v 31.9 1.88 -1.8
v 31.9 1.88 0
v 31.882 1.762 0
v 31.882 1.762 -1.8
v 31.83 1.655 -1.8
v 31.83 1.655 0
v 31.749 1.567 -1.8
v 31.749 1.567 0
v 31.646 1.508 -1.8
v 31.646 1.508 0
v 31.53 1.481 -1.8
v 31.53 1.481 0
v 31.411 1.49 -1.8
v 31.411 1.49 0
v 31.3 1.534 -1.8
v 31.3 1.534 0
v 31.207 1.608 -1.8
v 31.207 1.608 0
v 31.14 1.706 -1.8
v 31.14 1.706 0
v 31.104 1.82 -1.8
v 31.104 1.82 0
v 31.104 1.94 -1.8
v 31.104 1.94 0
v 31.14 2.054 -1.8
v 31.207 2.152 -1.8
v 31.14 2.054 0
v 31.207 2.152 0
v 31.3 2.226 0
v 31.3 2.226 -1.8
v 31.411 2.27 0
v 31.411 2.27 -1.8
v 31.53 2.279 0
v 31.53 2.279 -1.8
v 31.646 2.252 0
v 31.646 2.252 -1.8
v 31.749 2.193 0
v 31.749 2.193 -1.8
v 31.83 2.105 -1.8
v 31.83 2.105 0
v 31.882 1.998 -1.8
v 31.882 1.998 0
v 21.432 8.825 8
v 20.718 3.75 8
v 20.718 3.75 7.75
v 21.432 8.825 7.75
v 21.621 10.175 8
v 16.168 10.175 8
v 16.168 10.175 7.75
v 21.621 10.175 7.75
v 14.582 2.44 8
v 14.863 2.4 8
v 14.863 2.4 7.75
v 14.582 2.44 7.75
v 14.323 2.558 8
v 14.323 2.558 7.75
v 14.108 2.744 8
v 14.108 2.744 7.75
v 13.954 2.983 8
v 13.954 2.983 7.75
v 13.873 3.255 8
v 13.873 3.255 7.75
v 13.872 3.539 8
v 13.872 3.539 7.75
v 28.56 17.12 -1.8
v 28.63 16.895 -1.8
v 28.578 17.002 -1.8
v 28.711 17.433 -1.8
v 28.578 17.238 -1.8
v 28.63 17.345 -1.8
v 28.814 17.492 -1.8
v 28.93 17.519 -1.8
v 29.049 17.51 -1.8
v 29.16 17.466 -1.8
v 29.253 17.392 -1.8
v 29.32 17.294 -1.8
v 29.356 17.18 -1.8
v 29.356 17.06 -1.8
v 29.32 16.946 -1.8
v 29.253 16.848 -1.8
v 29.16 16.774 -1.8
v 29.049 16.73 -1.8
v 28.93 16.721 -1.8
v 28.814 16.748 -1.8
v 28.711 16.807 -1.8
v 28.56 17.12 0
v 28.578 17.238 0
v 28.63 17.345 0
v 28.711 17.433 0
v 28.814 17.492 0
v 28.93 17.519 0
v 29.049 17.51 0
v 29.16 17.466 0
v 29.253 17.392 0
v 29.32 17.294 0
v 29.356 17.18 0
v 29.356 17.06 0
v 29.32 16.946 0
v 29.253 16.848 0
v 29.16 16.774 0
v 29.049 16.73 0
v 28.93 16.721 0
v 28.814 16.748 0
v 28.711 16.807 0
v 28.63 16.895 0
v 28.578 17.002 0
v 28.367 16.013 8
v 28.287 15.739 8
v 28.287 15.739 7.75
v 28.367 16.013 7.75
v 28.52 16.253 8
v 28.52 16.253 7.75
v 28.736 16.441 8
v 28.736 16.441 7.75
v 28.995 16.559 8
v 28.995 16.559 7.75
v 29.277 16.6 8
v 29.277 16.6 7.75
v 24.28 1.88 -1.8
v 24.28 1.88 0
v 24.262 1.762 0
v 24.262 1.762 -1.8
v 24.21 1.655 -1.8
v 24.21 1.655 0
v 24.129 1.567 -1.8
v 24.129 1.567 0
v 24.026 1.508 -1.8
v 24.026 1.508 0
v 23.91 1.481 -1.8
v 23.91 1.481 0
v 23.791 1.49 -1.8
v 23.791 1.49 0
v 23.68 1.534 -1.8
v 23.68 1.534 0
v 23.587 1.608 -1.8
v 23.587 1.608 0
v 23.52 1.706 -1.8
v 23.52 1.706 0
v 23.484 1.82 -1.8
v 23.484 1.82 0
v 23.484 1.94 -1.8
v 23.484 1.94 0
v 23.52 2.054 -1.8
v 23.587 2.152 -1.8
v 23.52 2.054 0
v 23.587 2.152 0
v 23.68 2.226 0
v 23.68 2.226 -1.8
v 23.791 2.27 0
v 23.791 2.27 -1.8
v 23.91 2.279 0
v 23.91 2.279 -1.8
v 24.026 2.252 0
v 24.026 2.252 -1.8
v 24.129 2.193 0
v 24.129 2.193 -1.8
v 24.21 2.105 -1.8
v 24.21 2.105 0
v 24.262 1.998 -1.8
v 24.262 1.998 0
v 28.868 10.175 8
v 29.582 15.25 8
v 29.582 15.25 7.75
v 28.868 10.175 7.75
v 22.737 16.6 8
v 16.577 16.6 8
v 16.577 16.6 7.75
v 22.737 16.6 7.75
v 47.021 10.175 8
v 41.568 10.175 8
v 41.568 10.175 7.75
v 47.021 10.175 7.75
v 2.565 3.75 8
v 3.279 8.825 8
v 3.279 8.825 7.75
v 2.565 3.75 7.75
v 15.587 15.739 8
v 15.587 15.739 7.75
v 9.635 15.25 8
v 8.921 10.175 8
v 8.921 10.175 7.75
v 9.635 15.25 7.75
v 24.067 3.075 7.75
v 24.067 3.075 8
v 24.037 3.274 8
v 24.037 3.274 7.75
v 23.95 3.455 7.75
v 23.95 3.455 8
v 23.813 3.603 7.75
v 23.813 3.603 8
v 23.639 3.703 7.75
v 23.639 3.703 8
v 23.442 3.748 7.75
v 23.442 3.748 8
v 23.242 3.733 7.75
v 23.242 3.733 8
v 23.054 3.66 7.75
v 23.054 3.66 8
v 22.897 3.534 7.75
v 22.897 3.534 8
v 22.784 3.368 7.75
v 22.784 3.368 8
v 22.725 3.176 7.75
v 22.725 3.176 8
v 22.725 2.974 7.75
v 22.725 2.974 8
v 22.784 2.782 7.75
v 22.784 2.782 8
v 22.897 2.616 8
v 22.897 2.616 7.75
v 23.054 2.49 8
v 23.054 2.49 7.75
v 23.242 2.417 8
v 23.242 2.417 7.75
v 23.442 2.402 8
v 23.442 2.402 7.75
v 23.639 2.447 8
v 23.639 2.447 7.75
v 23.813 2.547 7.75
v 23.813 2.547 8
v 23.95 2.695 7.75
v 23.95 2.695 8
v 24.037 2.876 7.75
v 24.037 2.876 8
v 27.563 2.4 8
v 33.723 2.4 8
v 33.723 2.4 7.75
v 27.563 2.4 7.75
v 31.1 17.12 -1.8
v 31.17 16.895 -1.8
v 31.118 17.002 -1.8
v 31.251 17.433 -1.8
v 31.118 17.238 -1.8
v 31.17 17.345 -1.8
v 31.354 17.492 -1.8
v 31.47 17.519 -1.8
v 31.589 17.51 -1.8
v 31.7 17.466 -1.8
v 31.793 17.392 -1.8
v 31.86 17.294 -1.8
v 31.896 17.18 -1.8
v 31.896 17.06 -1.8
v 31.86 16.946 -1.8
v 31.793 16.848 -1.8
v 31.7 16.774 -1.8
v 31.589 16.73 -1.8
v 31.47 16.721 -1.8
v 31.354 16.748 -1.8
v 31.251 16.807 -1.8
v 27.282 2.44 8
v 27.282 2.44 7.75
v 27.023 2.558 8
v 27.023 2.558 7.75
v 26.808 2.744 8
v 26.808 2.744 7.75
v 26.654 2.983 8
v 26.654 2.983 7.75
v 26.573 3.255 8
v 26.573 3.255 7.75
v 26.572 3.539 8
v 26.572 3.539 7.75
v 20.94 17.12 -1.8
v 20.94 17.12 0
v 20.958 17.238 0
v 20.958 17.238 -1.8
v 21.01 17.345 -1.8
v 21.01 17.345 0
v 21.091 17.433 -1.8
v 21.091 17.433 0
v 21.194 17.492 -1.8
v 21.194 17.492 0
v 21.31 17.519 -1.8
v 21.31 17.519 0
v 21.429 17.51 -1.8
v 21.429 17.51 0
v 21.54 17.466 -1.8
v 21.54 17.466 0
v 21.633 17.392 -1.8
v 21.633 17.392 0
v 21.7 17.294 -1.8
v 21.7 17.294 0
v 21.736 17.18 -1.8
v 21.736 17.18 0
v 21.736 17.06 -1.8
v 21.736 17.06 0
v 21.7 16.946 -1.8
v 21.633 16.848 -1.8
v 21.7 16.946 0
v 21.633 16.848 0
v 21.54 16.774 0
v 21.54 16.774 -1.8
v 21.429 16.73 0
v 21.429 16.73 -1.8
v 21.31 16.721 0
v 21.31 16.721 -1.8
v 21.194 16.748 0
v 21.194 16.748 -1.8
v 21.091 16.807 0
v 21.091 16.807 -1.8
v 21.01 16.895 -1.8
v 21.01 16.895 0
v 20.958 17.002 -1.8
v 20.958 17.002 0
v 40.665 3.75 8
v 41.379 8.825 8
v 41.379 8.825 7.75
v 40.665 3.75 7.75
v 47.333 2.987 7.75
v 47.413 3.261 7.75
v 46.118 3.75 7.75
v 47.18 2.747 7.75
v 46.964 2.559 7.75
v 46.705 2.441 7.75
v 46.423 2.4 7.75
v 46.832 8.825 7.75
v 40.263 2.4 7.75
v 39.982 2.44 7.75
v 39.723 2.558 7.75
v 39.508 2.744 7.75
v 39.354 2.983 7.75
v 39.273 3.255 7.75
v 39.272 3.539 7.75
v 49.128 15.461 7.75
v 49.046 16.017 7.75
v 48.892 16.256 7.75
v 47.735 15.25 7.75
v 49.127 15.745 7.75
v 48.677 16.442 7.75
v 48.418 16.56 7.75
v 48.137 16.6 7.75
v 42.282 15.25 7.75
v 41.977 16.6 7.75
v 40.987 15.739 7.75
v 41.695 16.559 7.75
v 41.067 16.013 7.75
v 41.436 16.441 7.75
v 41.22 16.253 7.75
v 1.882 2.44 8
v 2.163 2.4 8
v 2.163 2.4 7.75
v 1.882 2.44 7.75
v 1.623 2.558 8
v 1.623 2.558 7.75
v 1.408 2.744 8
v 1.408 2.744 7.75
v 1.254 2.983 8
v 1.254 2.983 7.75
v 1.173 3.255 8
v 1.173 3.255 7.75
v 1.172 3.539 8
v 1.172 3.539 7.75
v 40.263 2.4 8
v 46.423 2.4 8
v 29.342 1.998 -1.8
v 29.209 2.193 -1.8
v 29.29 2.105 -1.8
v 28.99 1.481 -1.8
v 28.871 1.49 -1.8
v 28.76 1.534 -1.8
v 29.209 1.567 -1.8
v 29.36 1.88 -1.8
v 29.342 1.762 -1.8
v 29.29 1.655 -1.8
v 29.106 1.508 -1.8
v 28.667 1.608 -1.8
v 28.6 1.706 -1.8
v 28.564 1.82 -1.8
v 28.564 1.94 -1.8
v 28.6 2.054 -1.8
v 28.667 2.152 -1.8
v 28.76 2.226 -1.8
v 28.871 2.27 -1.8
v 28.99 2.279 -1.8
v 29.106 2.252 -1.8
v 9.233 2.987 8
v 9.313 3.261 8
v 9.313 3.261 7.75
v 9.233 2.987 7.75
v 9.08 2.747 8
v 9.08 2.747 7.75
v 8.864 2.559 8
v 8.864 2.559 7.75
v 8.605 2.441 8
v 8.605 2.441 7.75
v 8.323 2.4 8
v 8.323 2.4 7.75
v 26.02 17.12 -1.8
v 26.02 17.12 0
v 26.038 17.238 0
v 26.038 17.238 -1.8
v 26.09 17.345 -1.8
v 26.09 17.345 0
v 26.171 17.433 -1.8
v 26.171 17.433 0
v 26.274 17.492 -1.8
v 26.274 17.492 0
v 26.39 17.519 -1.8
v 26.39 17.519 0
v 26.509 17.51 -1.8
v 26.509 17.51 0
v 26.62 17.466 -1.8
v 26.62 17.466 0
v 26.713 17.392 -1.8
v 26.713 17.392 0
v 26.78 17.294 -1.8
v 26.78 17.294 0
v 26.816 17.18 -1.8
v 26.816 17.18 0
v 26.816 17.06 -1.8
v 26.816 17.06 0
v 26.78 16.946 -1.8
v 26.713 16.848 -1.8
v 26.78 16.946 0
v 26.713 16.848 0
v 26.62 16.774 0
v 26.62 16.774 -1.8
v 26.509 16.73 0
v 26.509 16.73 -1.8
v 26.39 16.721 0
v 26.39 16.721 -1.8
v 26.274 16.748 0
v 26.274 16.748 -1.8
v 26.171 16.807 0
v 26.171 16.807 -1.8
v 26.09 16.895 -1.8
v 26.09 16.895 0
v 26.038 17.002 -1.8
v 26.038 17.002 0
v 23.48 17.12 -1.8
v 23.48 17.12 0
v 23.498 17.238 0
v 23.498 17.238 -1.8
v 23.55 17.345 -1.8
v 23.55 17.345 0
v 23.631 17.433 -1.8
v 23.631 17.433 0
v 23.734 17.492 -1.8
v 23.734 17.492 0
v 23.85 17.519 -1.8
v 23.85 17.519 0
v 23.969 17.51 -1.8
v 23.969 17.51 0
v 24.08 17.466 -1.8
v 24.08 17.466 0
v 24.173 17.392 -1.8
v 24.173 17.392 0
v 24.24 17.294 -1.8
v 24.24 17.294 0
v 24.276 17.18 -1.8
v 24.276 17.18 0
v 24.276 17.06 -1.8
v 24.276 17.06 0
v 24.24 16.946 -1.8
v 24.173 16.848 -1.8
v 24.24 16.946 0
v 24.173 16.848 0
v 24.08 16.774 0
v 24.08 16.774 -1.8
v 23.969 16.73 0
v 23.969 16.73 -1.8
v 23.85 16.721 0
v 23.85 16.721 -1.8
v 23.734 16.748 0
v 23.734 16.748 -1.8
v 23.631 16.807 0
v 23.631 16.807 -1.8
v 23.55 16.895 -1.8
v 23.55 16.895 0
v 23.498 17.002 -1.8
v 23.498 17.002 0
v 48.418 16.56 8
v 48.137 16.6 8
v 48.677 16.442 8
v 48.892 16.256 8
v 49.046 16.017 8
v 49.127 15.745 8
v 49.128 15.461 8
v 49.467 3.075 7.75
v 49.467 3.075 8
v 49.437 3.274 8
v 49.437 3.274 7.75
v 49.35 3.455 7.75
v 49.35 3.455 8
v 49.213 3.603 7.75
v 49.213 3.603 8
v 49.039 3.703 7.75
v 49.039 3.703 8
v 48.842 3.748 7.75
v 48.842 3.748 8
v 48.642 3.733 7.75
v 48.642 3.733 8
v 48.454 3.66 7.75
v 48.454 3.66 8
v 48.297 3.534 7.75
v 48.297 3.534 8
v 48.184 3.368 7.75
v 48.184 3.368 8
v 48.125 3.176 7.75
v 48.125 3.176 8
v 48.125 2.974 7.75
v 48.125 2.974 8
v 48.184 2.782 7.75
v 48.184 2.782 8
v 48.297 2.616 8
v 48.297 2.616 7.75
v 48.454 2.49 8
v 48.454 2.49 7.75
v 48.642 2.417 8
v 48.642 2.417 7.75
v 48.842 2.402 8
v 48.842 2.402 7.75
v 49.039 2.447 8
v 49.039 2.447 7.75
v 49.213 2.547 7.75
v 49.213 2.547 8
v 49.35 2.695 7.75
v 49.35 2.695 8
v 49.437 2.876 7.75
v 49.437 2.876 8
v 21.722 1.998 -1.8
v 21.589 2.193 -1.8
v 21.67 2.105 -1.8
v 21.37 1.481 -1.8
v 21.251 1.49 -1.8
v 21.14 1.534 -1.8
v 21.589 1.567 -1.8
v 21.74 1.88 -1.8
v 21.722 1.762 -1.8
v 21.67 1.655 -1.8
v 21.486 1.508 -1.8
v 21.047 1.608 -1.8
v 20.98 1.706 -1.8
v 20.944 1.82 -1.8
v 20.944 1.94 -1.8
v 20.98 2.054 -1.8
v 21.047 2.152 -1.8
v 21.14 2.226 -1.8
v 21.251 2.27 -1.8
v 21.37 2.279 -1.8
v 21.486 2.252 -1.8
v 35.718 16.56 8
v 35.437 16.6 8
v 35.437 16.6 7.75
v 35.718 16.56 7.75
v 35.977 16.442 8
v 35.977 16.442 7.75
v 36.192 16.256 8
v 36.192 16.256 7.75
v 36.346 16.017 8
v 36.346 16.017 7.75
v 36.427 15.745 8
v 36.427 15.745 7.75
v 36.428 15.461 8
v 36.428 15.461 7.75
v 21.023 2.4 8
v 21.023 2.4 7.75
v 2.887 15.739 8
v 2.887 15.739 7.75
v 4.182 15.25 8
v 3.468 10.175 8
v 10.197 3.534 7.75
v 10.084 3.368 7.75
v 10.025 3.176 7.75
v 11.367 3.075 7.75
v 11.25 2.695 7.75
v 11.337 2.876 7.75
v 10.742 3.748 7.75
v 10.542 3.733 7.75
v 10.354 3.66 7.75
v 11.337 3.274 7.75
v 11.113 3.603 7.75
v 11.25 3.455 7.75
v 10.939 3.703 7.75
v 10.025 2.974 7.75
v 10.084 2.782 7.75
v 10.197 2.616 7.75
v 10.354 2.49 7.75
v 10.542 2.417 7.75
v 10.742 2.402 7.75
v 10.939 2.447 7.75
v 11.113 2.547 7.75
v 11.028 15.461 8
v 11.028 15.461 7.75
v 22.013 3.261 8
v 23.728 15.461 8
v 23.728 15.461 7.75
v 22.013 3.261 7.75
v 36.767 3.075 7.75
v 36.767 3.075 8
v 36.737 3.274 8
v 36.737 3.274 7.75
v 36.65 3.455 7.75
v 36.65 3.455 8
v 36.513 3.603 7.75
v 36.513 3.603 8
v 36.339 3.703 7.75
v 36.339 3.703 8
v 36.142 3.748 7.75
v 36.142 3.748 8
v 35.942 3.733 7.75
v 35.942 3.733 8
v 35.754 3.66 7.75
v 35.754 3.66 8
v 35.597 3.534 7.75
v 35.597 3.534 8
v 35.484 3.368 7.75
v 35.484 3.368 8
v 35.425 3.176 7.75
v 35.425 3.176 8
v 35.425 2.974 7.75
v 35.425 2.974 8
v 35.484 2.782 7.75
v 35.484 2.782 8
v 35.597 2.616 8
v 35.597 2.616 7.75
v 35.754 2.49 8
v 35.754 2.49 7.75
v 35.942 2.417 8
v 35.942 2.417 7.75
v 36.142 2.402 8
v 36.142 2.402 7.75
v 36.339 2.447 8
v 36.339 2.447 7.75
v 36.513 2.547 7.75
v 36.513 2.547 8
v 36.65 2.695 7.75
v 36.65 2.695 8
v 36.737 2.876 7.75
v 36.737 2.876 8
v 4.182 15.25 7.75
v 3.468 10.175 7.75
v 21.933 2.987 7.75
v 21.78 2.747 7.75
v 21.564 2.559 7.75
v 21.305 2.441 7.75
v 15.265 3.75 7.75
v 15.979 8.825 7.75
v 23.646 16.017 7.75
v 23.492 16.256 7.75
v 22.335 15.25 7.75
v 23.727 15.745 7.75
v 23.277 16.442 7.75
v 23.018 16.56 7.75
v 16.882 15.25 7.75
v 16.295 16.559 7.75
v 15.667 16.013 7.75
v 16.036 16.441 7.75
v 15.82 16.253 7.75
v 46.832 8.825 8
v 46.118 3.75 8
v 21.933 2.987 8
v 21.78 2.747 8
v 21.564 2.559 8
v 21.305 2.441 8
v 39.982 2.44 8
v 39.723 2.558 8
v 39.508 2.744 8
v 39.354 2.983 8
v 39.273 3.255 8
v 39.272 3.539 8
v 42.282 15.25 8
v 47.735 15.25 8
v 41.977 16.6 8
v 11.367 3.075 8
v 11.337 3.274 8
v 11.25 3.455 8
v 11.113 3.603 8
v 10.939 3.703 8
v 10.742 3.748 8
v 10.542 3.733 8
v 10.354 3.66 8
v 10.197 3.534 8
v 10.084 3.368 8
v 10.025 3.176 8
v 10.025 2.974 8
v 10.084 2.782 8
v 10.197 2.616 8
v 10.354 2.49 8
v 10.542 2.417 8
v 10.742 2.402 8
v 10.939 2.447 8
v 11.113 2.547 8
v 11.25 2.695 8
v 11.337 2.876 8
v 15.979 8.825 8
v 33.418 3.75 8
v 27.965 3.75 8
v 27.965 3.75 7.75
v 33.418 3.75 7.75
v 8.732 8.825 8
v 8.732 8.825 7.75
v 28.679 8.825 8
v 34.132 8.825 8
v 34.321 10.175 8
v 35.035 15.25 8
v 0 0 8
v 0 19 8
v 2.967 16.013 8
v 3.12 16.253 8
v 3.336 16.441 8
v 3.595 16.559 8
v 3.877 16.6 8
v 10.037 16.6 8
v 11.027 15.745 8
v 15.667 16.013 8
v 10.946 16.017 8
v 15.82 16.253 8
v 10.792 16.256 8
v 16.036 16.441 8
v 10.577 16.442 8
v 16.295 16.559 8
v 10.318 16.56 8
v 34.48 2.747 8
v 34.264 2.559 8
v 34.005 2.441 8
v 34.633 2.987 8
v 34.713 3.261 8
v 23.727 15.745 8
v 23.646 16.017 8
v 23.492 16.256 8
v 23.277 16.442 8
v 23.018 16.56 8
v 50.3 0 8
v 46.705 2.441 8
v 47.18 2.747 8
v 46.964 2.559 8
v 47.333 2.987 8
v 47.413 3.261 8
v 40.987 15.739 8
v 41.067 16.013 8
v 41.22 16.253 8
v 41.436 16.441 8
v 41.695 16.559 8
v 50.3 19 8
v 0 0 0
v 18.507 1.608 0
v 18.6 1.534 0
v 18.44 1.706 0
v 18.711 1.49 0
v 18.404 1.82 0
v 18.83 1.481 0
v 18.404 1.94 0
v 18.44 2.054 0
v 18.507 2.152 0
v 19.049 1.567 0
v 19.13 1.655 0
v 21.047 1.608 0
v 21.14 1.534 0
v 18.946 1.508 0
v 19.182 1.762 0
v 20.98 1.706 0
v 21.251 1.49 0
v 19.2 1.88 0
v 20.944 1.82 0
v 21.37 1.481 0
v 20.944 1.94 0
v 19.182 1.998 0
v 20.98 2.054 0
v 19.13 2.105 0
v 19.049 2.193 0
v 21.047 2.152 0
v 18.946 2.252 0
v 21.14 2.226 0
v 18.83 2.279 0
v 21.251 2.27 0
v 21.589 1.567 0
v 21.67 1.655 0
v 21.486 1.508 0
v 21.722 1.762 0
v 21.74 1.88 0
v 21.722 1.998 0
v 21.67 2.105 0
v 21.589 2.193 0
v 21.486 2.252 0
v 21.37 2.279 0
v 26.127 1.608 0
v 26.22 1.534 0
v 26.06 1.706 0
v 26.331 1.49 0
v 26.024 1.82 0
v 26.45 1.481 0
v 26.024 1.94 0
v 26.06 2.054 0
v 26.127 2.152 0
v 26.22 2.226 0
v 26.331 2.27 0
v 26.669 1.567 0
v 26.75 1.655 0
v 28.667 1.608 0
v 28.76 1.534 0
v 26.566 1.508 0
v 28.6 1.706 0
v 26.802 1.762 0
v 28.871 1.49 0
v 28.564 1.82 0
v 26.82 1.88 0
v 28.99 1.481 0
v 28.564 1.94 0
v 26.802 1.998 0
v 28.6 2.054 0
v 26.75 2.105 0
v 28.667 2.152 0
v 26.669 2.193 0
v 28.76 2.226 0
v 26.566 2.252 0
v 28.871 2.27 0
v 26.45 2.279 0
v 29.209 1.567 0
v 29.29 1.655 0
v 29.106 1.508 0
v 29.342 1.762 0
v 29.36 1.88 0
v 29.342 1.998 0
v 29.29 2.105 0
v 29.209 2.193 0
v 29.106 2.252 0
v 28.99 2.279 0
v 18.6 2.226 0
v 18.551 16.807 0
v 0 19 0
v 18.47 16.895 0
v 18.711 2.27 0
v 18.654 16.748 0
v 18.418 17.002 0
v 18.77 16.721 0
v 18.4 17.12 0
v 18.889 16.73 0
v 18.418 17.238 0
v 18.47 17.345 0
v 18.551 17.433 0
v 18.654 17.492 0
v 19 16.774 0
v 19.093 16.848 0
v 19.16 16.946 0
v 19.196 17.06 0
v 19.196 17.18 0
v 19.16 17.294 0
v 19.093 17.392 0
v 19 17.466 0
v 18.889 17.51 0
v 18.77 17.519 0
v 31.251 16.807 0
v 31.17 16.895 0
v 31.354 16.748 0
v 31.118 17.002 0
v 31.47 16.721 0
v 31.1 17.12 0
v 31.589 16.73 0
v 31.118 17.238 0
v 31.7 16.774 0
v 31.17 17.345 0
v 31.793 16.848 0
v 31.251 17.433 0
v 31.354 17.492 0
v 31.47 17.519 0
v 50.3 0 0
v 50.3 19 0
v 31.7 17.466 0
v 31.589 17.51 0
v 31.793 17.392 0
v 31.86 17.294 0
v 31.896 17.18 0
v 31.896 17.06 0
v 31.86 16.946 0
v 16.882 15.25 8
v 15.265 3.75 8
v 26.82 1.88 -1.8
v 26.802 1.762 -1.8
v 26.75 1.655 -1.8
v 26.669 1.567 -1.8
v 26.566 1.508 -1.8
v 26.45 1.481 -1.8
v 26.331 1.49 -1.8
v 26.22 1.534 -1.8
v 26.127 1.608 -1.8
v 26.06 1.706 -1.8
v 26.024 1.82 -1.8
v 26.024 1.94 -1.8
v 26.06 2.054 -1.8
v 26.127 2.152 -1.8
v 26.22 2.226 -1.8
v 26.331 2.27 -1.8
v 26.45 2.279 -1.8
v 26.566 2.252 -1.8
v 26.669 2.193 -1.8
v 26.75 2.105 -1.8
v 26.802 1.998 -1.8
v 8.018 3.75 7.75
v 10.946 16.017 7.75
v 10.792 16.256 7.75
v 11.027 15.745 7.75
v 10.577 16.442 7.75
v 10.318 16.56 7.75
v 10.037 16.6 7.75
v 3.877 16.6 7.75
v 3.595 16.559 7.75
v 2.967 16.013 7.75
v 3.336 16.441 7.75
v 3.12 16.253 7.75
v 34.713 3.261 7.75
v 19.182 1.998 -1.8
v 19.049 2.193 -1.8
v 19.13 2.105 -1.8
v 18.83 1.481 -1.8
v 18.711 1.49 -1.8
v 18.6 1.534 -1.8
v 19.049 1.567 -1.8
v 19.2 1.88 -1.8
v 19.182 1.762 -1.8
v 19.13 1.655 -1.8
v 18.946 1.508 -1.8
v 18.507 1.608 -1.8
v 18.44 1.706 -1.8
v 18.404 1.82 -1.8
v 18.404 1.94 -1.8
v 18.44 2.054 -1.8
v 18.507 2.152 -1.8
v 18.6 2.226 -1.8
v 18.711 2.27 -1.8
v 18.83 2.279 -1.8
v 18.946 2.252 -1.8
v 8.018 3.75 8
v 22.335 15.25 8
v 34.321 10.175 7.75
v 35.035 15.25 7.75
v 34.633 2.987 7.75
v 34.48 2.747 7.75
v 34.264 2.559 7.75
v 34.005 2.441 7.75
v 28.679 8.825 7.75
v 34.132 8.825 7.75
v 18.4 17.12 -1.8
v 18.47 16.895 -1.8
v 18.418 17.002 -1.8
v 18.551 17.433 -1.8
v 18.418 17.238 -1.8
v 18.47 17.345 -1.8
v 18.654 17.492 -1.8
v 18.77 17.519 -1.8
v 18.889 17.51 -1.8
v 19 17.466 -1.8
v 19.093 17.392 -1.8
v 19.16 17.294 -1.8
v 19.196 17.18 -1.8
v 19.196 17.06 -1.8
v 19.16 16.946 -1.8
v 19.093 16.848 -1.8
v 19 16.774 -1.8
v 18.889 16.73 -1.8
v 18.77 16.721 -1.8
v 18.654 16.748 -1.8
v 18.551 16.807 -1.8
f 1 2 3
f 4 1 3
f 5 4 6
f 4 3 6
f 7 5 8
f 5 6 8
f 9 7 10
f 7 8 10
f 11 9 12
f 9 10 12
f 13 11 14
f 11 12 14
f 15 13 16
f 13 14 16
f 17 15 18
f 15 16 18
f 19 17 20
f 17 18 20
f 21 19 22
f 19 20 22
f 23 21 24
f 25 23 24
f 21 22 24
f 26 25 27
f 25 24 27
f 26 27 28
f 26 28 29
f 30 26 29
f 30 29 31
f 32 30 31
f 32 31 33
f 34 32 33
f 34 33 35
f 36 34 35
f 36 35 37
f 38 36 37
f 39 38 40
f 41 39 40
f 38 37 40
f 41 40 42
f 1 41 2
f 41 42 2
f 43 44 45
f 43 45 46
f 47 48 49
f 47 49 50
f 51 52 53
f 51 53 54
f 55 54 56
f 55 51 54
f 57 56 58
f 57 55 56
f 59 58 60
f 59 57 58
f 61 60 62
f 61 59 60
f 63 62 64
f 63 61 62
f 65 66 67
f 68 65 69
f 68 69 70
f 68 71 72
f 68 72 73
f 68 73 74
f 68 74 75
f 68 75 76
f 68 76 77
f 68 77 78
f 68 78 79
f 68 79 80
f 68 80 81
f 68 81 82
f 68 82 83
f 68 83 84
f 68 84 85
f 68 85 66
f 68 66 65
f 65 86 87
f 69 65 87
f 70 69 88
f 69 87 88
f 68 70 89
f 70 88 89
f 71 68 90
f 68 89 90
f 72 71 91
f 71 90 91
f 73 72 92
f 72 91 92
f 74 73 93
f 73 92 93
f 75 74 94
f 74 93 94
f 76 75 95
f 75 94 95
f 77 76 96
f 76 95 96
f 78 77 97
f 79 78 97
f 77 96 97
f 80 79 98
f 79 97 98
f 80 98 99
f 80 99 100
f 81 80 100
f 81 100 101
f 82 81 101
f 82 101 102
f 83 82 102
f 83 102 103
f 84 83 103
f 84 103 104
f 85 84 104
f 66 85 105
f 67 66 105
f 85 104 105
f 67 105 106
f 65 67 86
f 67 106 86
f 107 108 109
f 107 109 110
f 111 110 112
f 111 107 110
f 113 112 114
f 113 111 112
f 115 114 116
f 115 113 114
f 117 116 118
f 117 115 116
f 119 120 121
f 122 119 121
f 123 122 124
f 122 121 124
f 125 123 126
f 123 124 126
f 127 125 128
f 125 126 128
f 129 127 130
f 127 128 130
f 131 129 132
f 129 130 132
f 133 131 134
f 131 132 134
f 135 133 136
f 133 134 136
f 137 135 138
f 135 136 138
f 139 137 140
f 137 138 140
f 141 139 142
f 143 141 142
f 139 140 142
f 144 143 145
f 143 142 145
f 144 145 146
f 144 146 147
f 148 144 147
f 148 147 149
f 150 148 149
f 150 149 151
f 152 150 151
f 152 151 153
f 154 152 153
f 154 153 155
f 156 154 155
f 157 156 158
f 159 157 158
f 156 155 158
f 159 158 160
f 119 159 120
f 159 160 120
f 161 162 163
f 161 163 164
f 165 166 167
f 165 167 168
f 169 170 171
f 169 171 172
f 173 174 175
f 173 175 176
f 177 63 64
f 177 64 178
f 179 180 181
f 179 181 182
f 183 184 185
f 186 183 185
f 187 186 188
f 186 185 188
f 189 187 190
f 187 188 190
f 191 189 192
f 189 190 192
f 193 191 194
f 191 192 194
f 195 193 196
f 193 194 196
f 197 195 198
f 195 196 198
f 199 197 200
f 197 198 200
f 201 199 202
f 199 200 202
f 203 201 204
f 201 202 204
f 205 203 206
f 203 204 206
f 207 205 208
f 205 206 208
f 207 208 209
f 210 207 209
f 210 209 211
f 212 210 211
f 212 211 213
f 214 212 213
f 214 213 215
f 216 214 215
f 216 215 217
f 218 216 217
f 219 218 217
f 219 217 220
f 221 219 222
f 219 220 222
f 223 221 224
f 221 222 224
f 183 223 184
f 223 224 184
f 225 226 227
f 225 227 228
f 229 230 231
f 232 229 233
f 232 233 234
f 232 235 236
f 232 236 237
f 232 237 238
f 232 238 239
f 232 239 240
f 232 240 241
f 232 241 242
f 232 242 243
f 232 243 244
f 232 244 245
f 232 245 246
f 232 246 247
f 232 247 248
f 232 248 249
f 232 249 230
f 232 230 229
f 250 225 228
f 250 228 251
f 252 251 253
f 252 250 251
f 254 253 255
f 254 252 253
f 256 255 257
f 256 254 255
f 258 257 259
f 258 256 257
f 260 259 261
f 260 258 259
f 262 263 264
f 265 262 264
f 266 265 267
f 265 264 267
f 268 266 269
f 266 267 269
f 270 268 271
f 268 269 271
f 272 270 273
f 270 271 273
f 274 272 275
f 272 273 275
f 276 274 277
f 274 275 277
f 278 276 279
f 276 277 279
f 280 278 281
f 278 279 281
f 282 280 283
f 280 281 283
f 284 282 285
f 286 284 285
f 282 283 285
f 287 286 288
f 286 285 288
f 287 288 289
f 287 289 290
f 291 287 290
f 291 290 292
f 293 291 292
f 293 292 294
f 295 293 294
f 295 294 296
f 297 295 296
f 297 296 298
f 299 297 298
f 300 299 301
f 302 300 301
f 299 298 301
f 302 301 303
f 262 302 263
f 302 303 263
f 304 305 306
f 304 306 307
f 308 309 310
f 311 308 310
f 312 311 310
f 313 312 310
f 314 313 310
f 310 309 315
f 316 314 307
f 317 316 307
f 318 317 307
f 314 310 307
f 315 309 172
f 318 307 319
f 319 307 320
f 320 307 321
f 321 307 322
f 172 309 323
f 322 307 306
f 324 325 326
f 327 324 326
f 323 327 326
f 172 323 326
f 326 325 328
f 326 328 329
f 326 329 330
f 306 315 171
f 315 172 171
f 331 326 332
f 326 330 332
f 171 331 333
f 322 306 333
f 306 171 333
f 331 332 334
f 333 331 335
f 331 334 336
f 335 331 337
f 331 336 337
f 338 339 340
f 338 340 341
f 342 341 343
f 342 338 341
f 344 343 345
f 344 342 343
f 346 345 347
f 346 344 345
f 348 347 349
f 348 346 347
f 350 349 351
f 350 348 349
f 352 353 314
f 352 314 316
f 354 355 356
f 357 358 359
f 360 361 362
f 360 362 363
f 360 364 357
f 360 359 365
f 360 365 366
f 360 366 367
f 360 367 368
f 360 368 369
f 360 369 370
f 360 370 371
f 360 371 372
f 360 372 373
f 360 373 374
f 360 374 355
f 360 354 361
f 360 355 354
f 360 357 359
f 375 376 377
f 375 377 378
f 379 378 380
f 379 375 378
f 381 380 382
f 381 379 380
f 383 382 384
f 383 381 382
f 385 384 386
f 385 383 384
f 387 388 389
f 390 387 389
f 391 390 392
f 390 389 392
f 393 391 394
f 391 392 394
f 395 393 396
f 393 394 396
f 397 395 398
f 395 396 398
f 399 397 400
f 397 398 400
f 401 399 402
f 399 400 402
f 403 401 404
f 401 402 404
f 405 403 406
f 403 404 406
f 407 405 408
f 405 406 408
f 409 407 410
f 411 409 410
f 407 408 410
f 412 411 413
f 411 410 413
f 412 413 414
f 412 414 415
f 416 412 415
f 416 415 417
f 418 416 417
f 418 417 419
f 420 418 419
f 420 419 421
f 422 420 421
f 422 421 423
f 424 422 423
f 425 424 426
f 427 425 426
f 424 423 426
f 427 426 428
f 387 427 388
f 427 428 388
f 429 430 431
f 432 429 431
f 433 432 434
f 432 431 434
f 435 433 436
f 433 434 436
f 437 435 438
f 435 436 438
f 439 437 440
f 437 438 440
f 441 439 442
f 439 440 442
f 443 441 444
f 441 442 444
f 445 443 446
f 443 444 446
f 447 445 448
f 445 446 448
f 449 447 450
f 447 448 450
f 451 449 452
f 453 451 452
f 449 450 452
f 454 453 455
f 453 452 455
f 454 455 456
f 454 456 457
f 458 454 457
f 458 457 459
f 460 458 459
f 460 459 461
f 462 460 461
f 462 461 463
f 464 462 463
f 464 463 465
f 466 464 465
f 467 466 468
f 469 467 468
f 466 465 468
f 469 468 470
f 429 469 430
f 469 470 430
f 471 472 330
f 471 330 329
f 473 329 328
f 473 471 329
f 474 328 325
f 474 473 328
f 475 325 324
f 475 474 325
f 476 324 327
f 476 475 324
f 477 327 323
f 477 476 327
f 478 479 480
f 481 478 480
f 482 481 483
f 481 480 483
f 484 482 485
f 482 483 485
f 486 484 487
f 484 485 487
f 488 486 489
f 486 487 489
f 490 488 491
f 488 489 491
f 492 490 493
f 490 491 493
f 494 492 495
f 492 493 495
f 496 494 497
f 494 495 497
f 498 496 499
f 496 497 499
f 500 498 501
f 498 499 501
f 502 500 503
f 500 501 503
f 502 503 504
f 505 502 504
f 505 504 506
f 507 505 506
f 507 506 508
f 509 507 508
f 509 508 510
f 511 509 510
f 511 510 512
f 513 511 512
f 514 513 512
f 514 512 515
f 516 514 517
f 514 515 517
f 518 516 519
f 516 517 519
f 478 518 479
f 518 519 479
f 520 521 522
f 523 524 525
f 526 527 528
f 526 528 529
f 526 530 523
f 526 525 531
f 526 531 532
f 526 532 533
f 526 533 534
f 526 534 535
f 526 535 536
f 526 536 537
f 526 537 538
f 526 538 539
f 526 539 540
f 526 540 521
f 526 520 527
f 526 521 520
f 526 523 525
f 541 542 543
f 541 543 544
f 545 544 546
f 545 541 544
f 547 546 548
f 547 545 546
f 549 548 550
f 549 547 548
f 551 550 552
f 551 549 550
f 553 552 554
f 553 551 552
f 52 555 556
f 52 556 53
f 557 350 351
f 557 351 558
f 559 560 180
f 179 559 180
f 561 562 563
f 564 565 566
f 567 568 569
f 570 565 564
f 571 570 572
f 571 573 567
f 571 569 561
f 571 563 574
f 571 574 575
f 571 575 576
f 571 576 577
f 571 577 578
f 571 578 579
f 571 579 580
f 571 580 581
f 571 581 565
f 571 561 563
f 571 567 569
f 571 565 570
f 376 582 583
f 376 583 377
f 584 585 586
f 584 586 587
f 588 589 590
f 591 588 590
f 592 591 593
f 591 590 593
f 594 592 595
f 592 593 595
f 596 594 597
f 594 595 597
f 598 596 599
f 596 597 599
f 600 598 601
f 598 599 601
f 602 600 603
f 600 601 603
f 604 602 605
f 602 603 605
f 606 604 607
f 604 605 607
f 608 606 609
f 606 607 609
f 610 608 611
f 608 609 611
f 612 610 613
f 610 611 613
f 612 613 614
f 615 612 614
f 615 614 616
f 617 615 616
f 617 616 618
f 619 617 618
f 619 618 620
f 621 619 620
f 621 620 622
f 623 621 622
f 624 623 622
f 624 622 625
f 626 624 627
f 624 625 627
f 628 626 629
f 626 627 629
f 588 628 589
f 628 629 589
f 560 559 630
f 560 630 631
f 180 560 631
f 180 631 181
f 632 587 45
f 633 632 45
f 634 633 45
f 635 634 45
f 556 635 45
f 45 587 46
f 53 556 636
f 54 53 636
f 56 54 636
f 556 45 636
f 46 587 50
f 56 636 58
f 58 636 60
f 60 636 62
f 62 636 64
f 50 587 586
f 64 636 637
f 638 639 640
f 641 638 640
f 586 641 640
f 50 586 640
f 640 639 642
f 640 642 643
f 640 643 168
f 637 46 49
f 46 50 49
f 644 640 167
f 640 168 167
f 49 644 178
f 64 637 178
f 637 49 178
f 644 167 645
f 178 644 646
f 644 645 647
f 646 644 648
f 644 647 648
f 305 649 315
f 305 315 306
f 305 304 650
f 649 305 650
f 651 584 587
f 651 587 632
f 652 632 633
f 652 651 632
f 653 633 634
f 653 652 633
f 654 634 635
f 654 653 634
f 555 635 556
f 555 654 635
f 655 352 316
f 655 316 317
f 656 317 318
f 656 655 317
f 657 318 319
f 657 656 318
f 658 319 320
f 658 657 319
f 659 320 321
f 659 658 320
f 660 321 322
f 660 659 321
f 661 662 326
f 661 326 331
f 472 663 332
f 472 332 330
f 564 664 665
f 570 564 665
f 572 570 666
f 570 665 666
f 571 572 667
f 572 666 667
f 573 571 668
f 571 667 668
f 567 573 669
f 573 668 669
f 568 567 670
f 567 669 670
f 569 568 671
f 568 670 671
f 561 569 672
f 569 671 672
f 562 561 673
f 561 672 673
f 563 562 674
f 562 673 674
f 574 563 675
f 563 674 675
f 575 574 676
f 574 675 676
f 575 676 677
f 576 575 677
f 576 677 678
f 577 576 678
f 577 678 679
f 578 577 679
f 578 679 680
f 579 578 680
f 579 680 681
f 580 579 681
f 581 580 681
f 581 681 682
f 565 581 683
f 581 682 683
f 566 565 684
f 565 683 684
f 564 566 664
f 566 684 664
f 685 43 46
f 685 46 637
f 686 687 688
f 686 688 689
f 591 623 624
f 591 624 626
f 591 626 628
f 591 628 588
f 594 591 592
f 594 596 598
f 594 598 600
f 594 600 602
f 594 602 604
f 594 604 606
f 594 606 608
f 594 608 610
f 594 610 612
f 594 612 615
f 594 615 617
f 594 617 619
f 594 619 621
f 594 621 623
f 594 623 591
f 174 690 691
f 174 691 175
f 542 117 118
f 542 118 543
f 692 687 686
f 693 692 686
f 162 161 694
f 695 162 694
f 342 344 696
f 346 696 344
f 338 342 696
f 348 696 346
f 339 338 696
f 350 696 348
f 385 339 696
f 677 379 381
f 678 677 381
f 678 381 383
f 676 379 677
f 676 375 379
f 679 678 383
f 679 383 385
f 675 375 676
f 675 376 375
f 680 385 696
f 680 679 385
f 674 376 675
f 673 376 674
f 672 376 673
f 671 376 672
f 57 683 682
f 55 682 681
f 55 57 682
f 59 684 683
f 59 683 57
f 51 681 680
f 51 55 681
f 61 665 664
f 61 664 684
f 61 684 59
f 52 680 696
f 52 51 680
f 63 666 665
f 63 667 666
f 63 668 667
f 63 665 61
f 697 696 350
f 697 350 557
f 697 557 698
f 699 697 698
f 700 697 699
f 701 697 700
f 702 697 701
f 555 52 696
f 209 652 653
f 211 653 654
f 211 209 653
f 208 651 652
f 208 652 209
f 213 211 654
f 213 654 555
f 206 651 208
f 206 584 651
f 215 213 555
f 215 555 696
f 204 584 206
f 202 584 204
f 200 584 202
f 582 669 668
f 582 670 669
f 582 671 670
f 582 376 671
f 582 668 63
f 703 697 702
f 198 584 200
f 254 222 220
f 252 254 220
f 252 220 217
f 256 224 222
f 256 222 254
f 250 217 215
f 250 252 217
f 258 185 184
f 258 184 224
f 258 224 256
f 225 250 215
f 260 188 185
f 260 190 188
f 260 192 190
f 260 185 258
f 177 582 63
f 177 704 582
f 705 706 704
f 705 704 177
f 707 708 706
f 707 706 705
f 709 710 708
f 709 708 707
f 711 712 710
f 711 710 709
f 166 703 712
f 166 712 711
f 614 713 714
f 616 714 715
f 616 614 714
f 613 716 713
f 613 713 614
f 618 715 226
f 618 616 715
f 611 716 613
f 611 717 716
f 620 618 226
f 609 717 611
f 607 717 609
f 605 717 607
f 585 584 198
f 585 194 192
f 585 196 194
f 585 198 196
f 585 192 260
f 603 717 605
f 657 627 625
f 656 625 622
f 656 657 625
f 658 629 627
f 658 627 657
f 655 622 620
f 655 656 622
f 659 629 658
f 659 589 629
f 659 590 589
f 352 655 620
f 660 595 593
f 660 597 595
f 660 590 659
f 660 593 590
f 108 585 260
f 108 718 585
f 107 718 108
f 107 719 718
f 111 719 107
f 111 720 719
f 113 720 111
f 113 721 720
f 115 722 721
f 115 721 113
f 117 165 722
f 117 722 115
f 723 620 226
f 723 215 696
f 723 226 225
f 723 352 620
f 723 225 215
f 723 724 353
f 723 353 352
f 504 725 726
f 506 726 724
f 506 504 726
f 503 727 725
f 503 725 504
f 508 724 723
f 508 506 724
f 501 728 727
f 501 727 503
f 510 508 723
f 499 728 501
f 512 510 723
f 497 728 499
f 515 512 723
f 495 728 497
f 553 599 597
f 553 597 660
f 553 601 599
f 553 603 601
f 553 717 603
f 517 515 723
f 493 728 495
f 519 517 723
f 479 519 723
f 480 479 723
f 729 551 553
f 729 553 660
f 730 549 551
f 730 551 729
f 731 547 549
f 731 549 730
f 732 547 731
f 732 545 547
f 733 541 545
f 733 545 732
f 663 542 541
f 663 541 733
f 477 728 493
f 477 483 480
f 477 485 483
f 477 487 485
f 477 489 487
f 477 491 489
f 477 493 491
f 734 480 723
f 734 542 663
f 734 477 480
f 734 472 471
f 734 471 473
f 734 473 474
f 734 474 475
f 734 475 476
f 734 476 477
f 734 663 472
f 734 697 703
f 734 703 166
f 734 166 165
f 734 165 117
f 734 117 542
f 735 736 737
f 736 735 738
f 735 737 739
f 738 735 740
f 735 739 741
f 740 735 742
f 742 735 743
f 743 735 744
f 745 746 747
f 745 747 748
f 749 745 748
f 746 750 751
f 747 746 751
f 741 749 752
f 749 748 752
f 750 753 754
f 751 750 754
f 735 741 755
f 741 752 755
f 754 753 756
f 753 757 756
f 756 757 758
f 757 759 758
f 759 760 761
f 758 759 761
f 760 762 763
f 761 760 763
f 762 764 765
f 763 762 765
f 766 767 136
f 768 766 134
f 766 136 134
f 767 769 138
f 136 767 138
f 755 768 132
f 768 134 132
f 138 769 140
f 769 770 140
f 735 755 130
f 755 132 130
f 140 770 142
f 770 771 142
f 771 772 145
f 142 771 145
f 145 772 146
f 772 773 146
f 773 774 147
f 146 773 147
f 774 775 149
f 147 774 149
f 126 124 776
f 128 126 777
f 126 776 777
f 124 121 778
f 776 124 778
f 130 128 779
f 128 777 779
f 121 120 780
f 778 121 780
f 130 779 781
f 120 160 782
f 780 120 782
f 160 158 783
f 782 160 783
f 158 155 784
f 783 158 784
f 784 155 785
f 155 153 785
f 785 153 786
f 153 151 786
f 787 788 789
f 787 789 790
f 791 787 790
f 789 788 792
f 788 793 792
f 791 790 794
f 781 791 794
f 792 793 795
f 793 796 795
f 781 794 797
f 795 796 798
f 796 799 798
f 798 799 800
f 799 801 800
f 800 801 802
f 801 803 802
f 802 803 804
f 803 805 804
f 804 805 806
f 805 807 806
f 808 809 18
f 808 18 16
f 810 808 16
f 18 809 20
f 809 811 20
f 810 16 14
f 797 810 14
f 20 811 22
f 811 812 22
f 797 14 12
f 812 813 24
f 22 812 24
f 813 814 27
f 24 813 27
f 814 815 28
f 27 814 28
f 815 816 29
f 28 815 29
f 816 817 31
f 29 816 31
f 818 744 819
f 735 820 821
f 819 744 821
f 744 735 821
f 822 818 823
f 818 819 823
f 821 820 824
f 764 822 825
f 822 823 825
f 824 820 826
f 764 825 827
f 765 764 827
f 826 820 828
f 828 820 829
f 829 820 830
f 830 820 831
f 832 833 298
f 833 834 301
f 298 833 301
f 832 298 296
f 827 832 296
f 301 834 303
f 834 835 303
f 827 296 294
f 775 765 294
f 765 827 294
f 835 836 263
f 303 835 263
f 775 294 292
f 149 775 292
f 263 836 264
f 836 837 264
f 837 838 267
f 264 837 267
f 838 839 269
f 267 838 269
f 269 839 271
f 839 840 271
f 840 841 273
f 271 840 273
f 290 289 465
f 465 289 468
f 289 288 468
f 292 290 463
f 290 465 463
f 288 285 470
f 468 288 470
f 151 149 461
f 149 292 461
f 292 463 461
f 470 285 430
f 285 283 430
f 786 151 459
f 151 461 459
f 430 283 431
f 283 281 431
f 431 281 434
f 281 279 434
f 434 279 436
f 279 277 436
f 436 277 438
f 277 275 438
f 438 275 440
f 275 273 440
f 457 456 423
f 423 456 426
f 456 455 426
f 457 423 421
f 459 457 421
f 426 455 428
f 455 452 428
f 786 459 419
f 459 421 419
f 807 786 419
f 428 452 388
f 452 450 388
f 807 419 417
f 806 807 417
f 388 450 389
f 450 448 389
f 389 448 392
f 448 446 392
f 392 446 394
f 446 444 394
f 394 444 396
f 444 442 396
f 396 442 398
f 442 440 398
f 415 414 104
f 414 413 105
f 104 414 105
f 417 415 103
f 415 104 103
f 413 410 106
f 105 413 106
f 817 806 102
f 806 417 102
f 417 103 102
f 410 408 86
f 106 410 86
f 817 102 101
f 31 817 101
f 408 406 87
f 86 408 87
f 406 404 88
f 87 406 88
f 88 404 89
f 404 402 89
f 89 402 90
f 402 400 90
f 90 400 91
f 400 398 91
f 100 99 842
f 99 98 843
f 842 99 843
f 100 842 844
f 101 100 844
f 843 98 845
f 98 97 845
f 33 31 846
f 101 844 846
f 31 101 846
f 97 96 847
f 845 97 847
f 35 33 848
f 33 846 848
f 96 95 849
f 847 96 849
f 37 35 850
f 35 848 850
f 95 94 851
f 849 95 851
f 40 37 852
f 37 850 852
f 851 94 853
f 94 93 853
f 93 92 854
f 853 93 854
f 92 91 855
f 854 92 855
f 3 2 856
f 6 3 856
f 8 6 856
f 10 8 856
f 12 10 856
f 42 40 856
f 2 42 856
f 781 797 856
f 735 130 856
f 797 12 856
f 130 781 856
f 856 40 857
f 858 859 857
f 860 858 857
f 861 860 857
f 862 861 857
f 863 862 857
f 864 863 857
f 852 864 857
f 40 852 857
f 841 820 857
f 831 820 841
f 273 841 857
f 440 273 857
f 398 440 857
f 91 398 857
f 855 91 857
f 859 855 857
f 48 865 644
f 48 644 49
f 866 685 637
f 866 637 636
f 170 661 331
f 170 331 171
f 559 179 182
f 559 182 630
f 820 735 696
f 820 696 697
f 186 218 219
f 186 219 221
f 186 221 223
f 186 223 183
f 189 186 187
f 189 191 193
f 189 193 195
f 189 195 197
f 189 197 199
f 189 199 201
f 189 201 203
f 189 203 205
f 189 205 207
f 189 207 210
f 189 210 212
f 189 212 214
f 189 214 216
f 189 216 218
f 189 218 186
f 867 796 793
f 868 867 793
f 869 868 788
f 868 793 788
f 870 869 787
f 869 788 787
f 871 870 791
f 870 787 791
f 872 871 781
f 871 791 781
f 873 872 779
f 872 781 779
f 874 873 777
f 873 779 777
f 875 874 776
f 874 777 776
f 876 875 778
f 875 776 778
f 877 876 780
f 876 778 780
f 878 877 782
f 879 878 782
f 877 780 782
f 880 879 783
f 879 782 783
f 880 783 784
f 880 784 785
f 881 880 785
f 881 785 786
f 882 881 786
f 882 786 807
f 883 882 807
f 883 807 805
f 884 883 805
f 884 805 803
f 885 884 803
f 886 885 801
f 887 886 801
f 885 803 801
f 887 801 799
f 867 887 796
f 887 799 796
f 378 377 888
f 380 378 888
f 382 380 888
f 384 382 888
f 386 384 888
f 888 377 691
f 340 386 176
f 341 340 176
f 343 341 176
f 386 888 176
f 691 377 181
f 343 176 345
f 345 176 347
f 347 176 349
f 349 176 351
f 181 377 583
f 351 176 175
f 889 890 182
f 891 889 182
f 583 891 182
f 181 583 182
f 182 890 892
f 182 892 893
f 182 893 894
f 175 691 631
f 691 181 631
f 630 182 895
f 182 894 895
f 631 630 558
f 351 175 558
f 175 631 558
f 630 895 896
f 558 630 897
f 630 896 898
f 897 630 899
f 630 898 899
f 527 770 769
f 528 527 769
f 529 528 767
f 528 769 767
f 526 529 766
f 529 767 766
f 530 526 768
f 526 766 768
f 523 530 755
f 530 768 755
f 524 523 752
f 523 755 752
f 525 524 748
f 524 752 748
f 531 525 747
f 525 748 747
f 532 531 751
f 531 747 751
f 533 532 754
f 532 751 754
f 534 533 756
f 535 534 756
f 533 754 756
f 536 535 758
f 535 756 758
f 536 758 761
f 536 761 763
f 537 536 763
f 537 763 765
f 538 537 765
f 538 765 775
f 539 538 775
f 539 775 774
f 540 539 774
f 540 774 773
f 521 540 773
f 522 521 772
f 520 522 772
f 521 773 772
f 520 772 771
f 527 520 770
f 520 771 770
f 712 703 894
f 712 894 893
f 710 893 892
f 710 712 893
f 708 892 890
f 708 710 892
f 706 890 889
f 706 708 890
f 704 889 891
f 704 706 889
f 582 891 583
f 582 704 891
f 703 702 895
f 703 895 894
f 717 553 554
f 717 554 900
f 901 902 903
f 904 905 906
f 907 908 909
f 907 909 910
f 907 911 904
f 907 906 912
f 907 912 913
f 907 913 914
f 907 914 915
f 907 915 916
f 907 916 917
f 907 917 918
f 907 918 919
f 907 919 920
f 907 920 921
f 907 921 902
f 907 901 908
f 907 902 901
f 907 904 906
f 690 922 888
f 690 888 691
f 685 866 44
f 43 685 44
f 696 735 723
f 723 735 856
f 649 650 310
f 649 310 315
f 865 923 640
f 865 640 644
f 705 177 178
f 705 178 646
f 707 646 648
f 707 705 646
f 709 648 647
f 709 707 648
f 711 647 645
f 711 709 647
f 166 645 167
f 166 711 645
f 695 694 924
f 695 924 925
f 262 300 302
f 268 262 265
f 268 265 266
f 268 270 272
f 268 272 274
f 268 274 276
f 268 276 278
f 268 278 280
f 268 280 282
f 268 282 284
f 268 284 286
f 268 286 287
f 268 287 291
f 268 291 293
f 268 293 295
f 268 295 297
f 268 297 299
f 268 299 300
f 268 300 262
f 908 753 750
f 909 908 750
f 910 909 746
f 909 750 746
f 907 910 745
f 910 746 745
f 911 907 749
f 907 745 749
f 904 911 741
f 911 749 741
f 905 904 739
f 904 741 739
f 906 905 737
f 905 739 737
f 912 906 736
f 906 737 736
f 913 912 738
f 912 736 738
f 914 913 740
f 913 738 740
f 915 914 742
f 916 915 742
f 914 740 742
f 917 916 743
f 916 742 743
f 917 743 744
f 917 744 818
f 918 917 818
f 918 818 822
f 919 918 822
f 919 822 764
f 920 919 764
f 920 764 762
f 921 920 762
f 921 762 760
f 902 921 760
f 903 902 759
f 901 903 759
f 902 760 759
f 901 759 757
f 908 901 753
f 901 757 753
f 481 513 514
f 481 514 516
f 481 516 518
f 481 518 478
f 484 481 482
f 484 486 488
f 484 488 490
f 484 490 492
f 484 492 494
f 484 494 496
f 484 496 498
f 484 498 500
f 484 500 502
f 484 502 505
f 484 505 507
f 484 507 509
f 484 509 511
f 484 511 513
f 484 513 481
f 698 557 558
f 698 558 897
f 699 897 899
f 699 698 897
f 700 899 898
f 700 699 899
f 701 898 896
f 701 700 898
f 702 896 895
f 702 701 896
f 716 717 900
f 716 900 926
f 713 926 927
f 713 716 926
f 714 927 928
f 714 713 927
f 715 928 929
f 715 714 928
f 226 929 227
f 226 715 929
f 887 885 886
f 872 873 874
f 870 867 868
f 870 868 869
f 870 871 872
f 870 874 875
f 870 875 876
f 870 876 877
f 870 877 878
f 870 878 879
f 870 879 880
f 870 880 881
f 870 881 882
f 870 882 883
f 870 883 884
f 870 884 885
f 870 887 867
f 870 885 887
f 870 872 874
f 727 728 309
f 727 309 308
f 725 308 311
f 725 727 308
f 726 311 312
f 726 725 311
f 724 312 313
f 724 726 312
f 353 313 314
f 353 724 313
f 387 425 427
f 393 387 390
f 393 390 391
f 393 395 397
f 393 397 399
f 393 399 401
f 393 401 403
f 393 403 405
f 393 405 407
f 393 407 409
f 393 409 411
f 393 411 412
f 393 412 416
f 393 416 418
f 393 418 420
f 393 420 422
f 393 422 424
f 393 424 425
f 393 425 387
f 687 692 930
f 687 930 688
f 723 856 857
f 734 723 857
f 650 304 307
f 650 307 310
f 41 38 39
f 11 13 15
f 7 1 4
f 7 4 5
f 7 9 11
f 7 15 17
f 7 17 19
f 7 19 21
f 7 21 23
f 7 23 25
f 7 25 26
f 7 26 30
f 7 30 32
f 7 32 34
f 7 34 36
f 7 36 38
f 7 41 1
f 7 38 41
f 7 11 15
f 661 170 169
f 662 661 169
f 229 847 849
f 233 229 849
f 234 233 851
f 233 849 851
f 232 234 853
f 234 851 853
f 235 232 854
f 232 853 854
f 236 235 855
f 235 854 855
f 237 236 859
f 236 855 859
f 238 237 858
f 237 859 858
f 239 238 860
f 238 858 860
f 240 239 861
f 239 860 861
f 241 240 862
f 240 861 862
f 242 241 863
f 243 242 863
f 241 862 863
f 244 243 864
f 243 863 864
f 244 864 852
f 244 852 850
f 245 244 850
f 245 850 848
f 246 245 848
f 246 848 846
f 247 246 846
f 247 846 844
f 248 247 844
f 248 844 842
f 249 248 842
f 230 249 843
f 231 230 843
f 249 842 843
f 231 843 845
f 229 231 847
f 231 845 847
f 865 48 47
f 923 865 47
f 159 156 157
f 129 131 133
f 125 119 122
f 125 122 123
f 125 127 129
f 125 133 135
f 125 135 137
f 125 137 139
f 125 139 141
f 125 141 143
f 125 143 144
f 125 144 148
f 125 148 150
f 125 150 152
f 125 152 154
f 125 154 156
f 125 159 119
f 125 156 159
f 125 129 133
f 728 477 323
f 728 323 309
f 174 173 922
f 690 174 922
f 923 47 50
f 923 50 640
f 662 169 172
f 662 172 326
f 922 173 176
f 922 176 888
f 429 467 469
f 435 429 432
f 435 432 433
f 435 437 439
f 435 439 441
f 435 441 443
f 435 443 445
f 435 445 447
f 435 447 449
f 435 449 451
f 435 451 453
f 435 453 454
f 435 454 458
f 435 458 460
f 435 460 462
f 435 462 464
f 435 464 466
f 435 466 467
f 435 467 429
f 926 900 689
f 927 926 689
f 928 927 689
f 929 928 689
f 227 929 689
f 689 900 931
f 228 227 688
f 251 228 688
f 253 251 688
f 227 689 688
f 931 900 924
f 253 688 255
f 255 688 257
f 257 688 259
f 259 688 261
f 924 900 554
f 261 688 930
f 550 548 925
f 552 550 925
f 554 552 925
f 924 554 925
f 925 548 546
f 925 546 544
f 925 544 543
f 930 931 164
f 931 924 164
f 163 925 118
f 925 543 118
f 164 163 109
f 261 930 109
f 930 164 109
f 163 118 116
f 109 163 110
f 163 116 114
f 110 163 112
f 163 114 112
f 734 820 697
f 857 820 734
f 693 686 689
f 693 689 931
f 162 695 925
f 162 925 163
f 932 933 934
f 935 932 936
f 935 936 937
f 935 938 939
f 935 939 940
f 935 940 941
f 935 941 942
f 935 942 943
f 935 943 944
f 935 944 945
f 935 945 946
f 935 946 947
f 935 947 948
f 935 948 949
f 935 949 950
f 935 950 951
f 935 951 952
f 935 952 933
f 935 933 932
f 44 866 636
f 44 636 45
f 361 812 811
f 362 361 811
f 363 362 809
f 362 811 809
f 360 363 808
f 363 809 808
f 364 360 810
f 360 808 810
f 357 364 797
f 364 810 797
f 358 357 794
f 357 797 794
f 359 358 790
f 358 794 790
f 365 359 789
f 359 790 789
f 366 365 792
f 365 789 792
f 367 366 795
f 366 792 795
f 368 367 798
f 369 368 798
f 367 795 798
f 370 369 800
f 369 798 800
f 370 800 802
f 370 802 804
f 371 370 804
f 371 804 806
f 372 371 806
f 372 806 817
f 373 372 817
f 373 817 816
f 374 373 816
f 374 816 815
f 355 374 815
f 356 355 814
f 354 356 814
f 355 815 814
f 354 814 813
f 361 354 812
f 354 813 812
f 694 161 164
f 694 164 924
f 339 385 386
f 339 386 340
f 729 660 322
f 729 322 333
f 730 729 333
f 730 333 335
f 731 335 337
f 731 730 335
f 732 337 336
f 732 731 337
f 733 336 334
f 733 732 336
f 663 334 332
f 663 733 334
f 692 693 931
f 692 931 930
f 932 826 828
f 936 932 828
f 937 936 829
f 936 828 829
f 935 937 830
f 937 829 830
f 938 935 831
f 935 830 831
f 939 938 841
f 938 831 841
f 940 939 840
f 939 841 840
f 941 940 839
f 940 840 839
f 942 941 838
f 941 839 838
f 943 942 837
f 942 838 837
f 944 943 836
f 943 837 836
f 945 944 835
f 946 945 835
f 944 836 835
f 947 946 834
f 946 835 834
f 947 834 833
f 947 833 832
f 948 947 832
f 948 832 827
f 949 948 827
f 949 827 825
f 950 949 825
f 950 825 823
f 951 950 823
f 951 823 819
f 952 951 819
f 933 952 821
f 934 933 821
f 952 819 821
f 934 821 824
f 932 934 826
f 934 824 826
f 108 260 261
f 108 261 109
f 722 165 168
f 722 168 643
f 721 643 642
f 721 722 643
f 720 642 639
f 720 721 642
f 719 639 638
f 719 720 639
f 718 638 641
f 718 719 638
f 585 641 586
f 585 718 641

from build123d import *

# Parameters (mm, degrees)
SKETCH_1_W          = 50.3
SKETCH_1_H          = 19
EXTRUDE_1_DEPTH     = 8
SKETCH_2_R          = 0.4
EXTRUDE_2_DEPTH     = 1.8
SKETCH_3_R          = 0.675
CUT_EXTRUDE_1_DEPTH = 0.25


with BuildPart() as part:
    # 草图1 → 凸台-拉伸1 (new body)
    with BuildSketch(Plane.XY):
        with Locations((25.15, 9.5)):
            Rectangle(SKETCH_1_W, SKETCH_1_H)
    extrude(amount=EXTRUDE_1_DEPTH)

    # 草图2 → 凸台-拉伸2 (add)
    with BuildSketch(Plane(origin=(0, 0, 0), x_dir=(-1, 0, 0), z_dir=(0, 0, -1))):
        with Locations((-31.5, 17.12)):
            Circle(SKETCH_2_R)
        with Locations((-28.96, 17.12)):
            Circle(SKETCH_2_R)
        with Locations((-26.42, 17.12)):
            Circle(SKETCH_2_R)
        with Locations((-23.88, 17.12)):
            Circle(SKETCH_2_R)
        with Locations((-21.34, 17.12)):
            Circle(SKETCH_2_R)
        with Locations((-18.8, 17.12)):
            Circle(SKETCH_2_R)
        with Locations(Location((-18.8, 1.88, 0), (0, 0, 180))):
            Circle(SKETCH_2_R)
        with Locations(Location((-21.34, 1.88, 0), (0, 0, 180))):
            Circle(SKETCH_2_R)
        with Locations(Location((-23.88, 1.88, 0), (0, 0, 180))):
            Circle(SKETCH_2_R)
        with Locations(Location((-26.42, 1.88, 0), (0, 0, 180))):
            Circle(SKETCH_2_R)
        with Locations(Location((-28.96, 1.88, 0), (0, 0, 180))):
            Circle(SKETCH_2_R)
        with Locations(Location((-31.5, 1.88, 0), (0, 0, 180))):
            Circle(SKETCH_2_R)
    extrude(amount=EXTRUDE_2_DEPTH)

    # 草图3 → 切除-拉伸1 (cut)
    # profile 1 of 8: a face of its own
    with BuildSketch(Plane.XY.offset(8)):
        with BuildLine():
            ThreePointArc((9.312943073, 3.260826899), (8.978734033, 2.64529042), (8.322675004, 2.4))
            Line((8.322675004, 2.4), (2.162726812, 2.4))
            ThreePointArc((2.162726812, 2.4), (1.408017232, 2.743940971), (1.172458743, 3.539173101))
            Line((1.172458743, 3.539173101), (2.887056927, 15.739173101))
            ThreePointArc((2.887056927, 15.739173101), (3.221265967, 16.35470958), (3.877324996, 16.6))
            Line((3.877324996, 16.6), (10.037273188, 16.6))
            ThreePointArc((10.037273188, 16.6), (10.791982768, 16.256059029), (11.027541257, 15.460826899))
            Line((11.027541257, 15.460826899), (9.312943073, 3.260826899))
        make_face()
        Polygon((3.468330618, 10.175), (8.921399509, 10.175), (9.634644245, 15.25), (4.181575354, 15.25), align=None, mode=Mode.SUBTRACT)
        Polygon((3.278600491, 8.825), (2.565355755, 3.75), (8.018424646, 3.75), (8.731669382, 8.825), align=None, mode=Mode.SUBTRACT)
    # profile 2 of 8: a face of its own
    with BuildSketch(Plane.XY.offset(8)):
        with BuildLine():
            Line((23.727541257, 15.460826899), (22.012943073, 3.260826899))
            ThreePointArc((22.012943073, 3.260826899), (21.678734033, 2.64529042), (21.022675004, 2.4))
            Line((21.022675004, 2.4), (14.862726812, 2.4))
            ThreePointArc((14.862726812, 2.4), (14.108017232, 2.743940971), (13.872458743, 3.539173101))
            Line((13.872458743, 3.539173101), (15.587056927, 15.739173101))
            ThreePointArc((15.587056927, 15.739173101), (15.921265967, 16.35470958), (16.577324996, 16.6))
            Line((16.577324996, 16.6), (22.737273188, 16.6))
            ThreePointArc((22.737273188, 16.6), (23.491982768, 16.256059029), (23.727541257, 15.460826899))
        make_face()
        Polygon((16.168330618, 10.175), (21.621399509, 10.175), (22.334644245, 15.25), (16.881575354, 15.25), align=None, mode=Mode.SUBTRACT)
        Polygon((15.265355755, 3.75), (20.718424646, 3.75), (21.431669382, 8.825), (15.978600491, 8.825), align=None, mode=Mode.SUBTRACT)
    # profile 3 of 8: a face of its own
    with BuildSketch(Plane.XY.offset(8)):
        with BuildLine():
            Line((36.427541257, 15.460826899), (34.712943073, 3.260826899))
            ThreePointArc((34.712943073, 3.260826899), (34.378734033, 2.64529042), (33.722675004, 2.4))
            Line((33.722675004, 2.4), (27.562726812, 2.4))
            ThreePointArc((27.562726812, 2.4), (26.808017232, 2.743940971), (26.572458743, 3.539173101))
            Line((26.572458743, 3.539173101), (28.287056927, 15.739173101))
            ThreePointArc((28.287056927, 15.739173101), (28.621265967, 16.35470958), (29.277324996, 16.6))
            Line((29.277324996, 16.6), (35.437273188, 16.6))
            ThreePointArc((35.437273188, 16.6), (36.191982768, 16.256059029), (36.427541257, 15.460826899))
        make_face()
        Polygon((28.868330618, 10.175), (34.321399509, 10.175), (35.034644245, 15.25), (29.581575354, 15.25), align=None, mode=Mode.SUBTRACT)
        Polygon((27.965355755, 3.75), (33.418424646, 3.75), (34.131669382, 8.825), (28.678600491, 8.825), align=None, mode=Mode.SUBTRACT)
    # profile 4 of 8: a face of its own
    with BuildSketch(Plane.XY.offset(8)):
        with BuildLine():
            Line((49.127541257, 15.460826899), (47.412943073, 3.260826899))
            ThreePointArc((47.412943073, 3.260826899), (47.078734033, 2.64529042), (46.422675004, 2.4))
            Line((46.422675004, 2.4), (40.262726812, 2.4))
            ThreePointArc((40.262726812, 2.4), (39.508017232, 2.743940971), (39.272458743, 3.539173101))
            Line((39.272458743, 3.539173101), (40.987056927, 15.739173101))
            ThreePointArc((40.987056927, 15.739173101), (41.321265967, 16.35470958), (41.977324996, 16.6))
            Line((41.977324996, 16.6), (48.137273188, 16.6))
            ThreePointArc((48.137273188, 16.6), (48.891982768, 16.256059029), (49.127541257, 15.460826899))
        make_face()
        Polygon((41.568330618, 10.175), (47.021399509, 10.175), (47.734644245, 15.25), (42.281575354, 15.25), align=None, mode=Mode.SUBTRACT)
        Polygon((40.665355755, 3.75), (46.118424646, 3.75), (46.831669382, 8.825), (41.378600491, 8.825), align=None, mode=Mode.SUBTRACT)
    # profile 5 of 8: a face of its own
    with BuildSketch(Plane.XY.offset(8)):
        with Locations((10.691961742, 3.075)):
            Circle(SKETCH_3_R)
    # profile 6 of 8: a face of its own
    with BuildSketch(Plane.XY.offset(8)):
        with Locations((23.391961742, 3.075)):
            Circle(SKETCH_3_R)
    # profile 7 of 8: a face of its own
    with BuildSketch(Plane.XY.offset(8)):
        with Locations((36.091961742, 3.075)):
            Circle(SKETCH_3_R)
    # profile 8 of 8: a face of its own
    with BuildSketch(Plane.XY.offset(8)):
        with Locations((48.791961742, 3.075)):
            Circle(SKETCH_3_R)
    extrude(amount=-CUT_EXTRUDE_1_DEPTH, mode=Mode.SUBTRACT)


solid = part.part
